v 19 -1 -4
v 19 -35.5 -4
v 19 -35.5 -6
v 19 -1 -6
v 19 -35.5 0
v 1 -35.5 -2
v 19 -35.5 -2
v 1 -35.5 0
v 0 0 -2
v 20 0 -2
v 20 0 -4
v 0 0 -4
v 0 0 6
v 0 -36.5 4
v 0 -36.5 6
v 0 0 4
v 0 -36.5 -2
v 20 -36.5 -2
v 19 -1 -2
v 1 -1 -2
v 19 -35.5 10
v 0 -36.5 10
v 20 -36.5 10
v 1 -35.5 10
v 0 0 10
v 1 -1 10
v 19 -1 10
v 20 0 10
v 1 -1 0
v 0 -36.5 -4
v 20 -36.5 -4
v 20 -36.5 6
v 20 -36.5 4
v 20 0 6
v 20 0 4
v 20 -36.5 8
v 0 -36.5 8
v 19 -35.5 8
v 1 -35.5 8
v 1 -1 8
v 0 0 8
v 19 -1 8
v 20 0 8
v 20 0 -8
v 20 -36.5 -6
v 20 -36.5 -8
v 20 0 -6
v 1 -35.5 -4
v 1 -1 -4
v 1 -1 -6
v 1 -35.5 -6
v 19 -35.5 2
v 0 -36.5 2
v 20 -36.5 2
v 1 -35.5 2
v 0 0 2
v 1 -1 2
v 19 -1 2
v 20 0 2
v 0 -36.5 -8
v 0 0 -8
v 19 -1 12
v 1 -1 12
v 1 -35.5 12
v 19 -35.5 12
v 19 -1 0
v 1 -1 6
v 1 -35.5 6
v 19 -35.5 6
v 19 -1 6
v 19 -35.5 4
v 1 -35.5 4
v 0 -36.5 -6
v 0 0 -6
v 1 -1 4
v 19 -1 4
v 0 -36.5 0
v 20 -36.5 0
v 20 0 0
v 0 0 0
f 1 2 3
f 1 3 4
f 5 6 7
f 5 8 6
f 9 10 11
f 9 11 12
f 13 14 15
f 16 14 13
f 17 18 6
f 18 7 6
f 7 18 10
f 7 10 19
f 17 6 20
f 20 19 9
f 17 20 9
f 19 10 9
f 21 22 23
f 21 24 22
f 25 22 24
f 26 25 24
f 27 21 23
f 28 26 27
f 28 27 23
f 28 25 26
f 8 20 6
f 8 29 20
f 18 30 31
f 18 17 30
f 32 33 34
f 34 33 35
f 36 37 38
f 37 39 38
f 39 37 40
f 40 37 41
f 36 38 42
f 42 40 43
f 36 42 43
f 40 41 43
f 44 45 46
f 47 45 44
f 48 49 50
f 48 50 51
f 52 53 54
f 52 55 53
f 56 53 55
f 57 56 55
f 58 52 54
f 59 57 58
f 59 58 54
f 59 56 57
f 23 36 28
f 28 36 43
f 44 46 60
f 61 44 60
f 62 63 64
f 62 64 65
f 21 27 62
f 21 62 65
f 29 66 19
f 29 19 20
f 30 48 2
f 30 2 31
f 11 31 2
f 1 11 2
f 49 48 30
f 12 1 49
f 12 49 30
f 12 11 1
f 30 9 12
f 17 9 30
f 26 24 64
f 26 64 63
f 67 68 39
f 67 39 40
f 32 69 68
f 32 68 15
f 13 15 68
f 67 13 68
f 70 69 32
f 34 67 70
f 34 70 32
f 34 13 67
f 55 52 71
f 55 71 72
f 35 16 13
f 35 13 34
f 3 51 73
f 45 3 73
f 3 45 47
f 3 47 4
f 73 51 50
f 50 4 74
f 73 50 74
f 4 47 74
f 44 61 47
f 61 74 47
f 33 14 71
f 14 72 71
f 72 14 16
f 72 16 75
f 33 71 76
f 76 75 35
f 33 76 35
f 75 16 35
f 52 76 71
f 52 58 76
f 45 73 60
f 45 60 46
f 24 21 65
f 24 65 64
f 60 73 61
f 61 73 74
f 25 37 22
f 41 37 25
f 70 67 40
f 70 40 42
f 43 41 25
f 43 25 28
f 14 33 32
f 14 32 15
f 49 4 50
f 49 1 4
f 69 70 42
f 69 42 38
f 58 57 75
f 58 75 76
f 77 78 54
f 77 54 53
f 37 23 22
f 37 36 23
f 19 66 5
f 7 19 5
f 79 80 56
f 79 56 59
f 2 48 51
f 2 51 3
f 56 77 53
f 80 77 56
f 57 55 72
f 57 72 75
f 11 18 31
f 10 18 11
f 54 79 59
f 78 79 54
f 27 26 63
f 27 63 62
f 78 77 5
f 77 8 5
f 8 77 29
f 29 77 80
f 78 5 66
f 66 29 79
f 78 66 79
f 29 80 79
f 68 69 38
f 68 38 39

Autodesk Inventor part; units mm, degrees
ref_plane "YZ Plane" through (0, 0, 0) normal (1, 0, 0) x (0, 1, 0)
ref_plane "XZ Plane" through (0, 0, 0) normal (0, 1, 0) x (-1, 0, 0)
ref_plane "XY Plane" through (0, 0, 0) normal (0, 0, 1) x (1, 0, 0)
sketch "草圖1" plane through (0, 0, 0) normal (0, 0, 1) x (1, 0, 0)
  line L0 (0, 0) -> (20, 0)
  line L1 (20, 0) -> (20, -36.5)
  line L2 (20, -36.5) -> (0, -36.5)
  line L3 (0, -36.5) -> (0, 0)
  dimension "d0" = 20
  dimension "d1" = 36.5
extrude "擠出1" add sketch "草圖1" along normal blind 2
sketch "草圖2" plane through (0, 0, 2) normal (0, 0, 1) x (1, 0, 0)
  line L0 (1, -1) -> (19, -1)
  line L1 (19, -1) -> (19, -35.5)
  line L2 (19, -35.5) -> (1, -35.5)
  line L3 (1, -35.5) -> (1, -1)
  line L4 (20, 0) -> (0, 0) projected
  line L5 (20, -36.5) -> (20, 0) projected
  line L6 (0, -36.5) -> (20, -36.5) projected
  line L7 (0, 0) -> (0, -36.5) projected
  dimension "d4" = 1
  dimension "d5" = 1
  dimension "d6" = 1
  dimension "d7" = 1
extrude "擠出2" add sketch "草圖2" along normal blind 2 contours L0 L1 L2 L3
sketch "草圖3" plane through (0, 0, 4) normal (0, 0, 1) x (1, 0, 0)
  line L0 (20, -36.5) -> (20, 0) projected
  line L1 (0, 0) -> (20, 0)
  line L2 (20, 0) -> (20, -36.5)
  line L3 (20, -36.5) -> (0, -36.5)
  line L4 (0, -36.5) -> (0, 0)
extrude "擠出3" add sketch "草圖3" along normal blind 2
sketch "草圖4" plane through (0, 0, 6) normal (0, 0, 1) x (1, 0, 0)
  line L0 (1, -35.5) -> (1, -1) projected
  line L1 (19, -1) -> (19, -35.5) projected
  line L2 (1, -1) -> (19, -1)
  line L3 (19, -1) -> (19, -35.5)
  line L4 (19, -35.5) -> (1, -35.5)
  line L5 (1, -35.5) -> (1, -1)
  point P0 (0, 0)
extrude "擠出4" add sketch "草圖4" along normal blind 2
sketch "草圖5" plane through (0, 0, 8) normal (0, 0, 1) x (1, 0, 0)
  line L0 (20, -36.5) -> (20, 0) projected
  line L1 (0, 0) -> (20, 0)
  line L2 (20, 0) -> (20, -36.5)
  line L3 (20, -36.5) -> (0, -36.5)
  line L4 (0, -36.5) -> (0, 0)
extrude "擠出5" add sketch "草圖5" along normal blind 2
sketch "草圖6" plane through (0, 0, 10) normal (0, 0, 1) x (1, 0, 0)
  line L0 (1, -1) -> (19, -1) projected
  line L1 (19, -35.5) -> (1, -35.5) projected
  line L2 (1, -1) -> (19, -1)
  line L3 (19, -1) -> (19, -35.5)
  line L4 (19, -35.5) -> (1, -35.5)
  line L5 (1, -35.5) -> (1, -1)
  point P0 (0, 0)
extrude "擠出6" add sketch "草圖6" along normal blind 2
sketch "草圖7" plane through (0, 0, 0) normal (0, 0, -1) x (-1, 0, 0)
  line L0 (-19, -1) -> (-19, -35.5) projected
  line L1 (-1, -1) -> (-1, -35.5) projected
  line L2 (-19, -1) -> (-1, -1)
  line L3 (-1, -1) -> (-1, -35.5)
  line L4 (-1, -35.5) -> (-19, -35.5)
  line L5 (-19, -35.5) -> (-19, -1)
  point P0 (0, 0)
extrude "擠出7" add sketch "草圖7" along normal blind 2
sketch "草圖8" plane through (0, 0, -2) normal (0, 0, -1) x (-1, 0, 0)
  line L0 (0, 0) -> (0, -36.5) projected
  line L1 (-20, 0) -> (0, 0)
  line L2 (0, 0) -> (0, -36.5)
  line L3 (0, -36.5) -> (-20, -36.5)
  line L4 (-20, -36.5) -> (-20, 0)
extrude "擠出8" add sketch "草圖8" along normal blind 2
sketch "草圖9" plane through (0, 0, -4) normal (0, 0, -1) x (-1, 0, 0)
  line L0 (-1, -1) -> (-1, -35.5) projected
  line L1 (-19, -1) -> (-1, -1)
  line L2 (-1, -1) -> (-1, -35.5)
  line L3 (-1, -35.5) -> (-19, -35.5)
  line L4 (-19, -35.5) -> (-19, -1)
  point P0 (0, 0)
extrude "擠出9" add sketch "草圖9" along normal blind 2
sketch "草圖10" plane through (0, 0, -6) normal (0, 0, -1) x (-1, 0, 0)
  line L0 (0, 0) -> (-20, 0) projected
  line L1 (0, -36.5) -> (0, 0) projected
  line L2 (-20, 0) -> (0, 0)
  line L3 (0, 0) -> (0, -36.5)
  line L4 (0, -36.5) -> (-20, -36.5)
  line L5 (-20, -36.5) -> (-20, 0)
extrude "擠出10" add sketch "草圖10" along normal blind 2
properties part number "連接件1"
